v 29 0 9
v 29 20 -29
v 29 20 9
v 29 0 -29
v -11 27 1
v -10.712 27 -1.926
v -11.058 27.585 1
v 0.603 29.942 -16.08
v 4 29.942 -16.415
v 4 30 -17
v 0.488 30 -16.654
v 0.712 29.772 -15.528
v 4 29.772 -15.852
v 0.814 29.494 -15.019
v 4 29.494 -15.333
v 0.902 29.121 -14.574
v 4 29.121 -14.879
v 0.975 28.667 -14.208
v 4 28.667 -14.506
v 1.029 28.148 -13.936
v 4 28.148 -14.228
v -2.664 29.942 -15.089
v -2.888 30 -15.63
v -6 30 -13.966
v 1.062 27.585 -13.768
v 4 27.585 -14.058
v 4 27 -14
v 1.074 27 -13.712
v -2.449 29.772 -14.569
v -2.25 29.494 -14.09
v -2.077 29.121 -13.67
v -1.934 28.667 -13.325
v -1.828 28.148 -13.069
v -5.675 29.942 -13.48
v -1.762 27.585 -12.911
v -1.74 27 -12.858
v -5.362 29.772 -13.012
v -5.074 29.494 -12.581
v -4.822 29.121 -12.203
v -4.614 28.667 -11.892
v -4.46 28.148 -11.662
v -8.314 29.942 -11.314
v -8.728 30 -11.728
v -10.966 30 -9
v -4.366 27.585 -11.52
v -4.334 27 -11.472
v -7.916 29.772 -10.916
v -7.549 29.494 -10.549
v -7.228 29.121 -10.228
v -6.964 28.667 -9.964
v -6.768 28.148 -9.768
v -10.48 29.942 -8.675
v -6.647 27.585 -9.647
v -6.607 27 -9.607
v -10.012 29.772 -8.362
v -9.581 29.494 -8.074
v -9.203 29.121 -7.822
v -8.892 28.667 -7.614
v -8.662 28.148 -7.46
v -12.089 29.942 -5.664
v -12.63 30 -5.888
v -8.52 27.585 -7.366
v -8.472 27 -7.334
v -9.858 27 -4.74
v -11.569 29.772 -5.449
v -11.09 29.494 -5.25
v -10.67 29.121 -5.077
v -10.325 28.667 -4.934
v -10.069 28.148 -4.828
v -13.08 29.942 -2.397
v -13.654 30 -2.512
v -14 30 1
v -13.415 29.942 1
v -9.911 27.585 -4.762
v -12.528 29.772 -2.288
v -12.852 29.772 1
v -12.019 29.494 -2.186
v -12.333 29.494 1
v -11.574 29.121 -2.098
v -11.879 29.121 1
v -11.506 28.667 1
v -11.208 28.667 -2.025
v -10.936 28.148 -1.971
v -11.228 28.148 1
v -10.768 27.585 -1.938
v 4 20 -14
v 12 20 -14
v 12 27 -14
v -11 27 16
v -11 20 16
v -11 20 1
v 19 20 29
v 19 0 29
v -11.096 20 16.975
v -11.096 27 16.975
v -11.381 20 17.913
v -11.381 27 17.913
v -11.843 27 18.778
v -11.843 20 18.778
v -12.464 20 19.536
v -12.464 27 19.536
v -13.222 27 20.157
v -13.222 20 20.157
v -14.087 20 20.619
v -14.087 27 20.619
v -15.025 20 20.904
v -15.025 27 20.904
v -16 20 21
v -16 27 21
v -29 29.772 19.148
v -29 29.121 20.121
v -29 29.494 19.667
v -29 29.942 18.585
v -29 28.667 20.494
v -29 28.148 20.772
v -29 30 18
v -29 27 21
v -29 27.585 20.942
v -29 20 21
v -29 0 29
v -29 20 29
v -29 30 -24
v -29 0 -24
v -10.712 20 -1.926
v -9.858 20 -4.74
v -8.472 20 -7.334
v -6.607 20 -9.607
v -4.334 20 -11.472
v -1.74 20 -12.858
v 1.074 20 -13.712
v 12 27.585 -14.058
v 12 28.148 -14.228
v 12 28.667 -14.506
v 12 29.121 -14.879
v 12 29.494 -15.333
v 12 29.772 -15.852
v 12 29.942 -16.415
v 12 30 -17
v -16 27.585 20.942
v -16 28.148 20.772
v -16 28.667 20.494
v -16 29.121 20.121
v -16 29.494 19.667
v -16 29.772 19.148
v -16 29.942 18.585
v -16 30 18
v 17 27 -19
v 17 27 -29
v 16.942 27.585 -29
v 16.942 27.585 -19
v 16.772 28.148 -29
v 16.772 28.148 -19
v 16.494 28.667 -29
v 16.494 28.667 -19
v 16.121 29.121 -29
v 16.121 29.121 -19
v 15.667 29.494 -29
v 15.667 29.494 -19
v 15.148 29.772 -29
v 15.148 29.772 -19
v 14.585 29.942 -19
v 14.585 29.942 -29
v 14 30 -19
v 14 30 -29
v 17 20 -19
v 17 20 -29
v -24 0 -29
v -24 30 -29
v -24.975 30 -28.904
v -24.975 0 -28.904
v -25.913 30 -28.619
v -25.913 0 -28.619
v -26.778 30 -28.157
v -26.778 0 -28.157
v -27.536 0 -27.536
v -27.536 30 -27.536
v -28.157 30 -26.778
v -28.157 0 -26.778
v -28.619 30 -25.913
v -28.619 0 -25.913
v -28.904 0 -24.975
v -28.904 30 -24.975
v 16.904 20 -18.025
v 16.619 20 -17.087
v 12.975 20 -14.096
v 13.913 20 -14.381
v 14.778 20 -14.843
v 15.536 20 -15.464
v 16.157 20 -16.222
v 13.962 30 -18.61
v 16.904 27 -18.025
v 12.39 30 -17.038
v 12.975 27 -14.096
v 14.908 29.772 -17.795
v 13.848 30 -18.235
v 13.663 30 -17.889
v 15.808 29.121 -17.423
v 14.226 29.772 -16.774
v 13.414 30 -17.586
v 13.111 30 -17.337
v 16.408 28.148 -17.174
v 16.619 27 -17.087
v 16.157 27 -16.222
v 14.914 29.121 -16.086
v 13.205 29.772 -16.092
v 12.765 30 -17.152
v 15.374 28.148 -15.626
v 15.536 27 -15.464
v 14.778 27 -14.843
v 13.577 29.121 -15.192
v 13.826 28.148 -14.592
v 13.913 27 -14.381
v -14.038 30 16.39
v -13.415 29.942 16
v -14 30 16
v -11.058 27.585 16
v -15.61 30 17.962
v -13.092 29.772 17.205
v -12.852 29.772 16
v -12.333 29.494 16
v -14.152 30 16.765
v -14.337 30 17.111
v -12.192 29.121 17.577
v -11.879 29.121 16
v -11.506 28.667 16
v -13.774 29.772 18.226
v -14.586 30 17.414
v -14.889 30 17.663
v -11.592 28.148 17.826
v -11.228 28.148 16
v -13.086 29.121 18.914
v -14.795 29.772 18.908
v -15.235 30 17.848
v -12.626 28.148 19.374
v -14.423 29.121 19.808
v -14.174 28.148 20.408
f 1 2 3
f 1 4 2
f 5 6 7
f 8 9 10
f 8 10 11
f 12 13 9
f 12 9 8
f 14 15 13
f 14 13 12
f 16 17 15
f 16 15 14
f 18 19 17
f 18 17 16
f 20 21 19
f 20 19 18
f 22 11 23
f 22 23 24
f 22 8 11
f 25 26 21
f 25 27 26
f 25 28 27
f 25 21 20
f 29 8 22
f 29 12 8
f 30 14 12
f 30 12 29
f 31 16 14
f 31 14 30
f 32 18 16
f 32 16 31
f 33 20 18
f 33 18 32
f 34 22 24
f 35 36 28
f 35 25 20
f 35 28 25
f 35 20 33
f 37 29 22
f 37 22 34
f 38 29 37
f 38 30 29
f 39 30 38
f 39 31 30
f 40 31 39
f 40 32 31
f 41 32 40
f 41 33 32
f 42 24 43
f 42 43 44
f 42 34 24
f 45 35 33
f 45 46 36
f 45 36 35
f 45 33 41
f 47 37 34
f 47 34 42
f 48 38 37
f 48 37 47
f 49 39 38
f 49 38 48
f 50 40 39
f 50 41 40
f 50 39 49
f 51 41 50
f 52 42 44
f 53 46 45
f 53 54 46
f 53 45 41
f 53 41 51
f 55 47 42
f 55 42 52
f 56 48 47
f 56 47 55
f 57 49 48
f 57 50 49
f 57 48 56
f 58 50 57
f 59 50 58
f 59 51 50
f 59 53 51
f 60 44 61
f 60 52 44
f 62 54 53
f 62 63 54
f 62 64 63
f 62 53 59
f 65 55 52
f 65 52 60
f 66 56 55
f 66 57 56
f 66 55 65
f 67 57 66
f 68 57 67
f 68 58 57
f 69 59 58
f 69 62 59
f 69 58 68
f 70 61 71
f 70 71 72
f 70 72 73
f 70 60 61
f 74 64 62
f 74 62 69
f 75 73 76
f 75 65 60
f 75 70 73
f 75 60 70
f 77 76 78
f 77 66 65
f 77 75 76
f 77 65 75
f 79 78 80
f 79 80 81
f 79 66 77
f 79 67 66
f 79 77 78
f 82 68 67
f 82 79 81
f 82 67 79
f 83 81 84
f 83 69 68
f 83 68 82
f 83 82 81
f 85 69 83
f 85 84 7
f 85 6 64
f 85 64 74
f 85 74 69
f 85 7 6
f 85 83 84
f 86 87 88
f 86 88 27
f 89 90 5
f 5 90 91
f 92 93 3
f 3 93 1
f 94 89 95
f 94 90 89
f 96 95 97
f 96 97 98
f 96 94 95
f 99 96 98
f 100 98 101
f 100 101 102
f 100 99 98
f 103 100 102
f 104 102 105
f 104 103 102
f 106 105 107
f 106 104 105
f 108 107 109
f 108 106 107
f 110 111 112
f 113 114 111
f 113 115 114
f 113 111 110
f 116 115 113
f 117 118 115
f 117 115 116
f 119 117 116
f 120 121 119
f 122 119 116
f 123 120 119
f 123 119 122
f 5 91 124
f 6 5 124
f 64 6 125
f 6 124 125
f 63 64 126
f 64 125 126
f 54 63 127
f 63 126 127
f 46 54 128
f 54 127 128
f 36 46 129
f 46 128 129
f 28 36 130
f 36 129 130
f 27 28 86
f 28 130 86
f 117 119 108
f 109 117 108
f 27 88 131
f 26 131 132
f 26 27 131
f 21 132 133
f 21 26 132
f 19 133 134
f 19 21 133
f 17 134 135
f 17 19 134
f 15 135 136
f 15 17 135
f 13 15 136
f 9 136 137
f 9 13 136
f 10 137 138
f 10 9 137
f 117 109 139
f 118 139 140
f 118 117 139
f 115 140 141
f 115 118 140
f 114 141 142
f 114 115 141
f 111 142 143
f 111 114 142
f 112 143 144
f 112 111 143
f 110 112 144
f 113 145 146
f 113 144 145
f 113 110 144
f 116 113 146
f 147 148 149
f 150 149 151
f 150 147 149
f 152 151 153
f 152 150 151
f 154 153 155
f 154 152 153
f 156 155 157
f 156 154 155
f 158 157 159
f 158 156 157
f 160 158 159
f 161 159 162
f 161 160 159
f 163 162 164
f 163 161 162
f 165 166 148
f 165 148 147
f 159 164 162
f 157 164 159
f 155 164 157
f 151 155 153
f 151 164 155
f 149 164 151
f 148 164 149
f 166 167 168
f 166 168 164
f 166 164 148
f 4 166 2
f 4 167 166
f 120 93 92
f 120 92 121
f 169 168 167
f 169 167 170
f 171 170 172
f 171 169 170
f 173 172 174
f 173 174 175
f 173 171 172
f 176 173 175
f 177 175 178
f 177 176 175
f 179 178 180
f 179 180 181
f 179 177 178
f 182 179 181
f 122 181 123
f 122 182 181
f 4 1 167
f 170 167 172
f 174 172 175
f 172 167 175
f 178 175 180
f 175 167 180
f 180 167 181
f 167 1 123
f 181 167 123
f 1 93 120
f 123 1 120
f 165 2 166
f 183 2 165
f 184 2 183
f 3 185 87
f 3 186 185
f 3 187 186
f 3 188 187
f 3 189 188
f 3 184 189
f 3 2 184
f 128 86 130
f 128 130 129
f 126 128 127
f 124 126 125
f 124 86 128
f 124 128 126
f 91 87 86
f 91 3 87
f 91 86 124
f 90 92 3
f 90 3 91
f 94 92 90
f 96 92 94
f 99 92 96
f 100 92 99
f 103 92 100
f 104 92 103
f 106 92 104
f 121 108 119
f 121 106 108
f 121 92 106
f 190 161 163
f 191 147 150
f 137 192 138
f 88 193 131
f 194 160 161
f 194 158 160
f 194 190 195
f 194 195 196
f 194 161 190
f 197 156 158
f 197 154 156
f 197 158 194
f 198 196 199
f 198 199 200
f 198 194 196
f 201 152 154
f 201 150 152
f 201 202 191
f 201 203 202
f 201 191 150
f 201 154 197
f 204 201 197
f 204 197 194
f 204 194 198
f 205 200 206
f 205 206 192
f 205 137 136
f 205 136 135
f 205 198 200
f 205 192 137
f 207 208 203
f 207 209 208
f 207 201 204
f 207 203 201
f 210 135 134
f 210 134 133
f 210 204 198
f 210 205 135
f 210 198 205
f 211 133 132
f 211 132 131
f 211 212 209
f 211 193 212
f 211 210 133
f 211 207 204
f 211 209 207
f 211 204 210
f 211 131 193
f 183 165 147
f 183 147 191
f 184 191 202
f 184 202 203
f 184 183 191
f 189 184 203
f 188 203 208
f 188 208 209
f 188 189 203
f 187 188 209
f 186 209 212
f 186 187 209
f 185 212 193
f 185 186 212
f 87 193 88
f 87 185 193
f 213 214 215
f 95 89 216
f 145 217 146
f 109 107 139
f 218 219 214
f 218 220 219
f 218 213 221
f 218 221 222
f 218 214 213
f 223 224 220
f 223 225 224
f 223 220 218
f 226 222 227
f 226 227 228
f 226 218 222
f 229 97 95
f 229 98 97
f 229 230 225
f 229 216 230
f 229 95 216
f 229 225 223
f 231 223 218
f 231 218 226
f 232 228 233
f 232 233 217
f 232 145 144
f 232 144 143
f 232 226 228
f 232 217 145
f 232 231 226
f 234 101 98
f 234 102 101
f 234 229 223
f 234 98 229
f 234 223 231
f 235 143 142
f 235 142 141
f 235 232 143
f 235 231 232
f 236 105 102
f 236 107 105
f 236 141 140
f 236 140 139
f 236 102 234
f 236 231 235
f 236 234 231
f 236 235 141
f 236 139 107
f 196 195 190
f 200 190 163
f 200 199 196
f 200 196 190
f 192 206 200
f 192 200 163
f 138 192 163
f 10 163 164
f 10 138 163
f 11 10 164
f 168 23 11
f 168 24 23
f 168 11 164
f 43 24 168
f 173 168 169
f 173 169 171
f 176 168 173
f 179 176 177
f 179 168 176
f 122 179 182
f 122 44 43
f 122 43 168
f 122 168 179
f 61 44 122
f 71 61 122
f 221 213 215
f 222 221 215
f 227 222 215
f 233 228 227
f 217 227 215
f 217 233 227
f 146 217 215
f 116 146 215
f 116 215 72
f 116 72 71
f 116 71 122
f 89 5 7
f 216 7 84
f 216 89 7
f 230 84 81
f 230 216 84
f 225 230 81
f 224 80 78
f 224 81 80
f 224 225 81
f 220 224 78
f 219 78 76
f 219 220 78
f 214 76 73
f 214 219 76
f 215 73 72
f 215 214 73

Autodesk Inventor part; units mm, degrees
ref_plane "YZ Plane" through (0, 0, 0) normal (1, 0, 0) x (0, 1, 0)
ref_plane "XZ Plane" through (0, 0, 0) normal (0, 1, 0) x (-1, 0, 0)
ref_plane "XY Plane" through (0, 0, 0) normal (0, 0, 1) x (1, 0, 0)
sketch "Schizzo11" plane through (0, 0, 0) normal (0, 1, 0) x (-1, 0, 0)
  line L0 (29, -29) -> (-29, -29)
  line L1 (-29, -29) -> (-29, 9)
  line L2 (-19, 29) -> (29, 29)
  line L3 (29, 29) -> (29, -29)
  line L4 (29, -29) -> (-29, 29) construction
  line L5 (-29, -29) -> (29, 29) construction
  line L6 (29, -29) -> (29, 21)
  line L7 (29, 21) -> (16, 21)
  line L8 (11, 16) -> (11, 1)
  line L9 (29, -29) -> (-17, -29)
  line L10 (-17, -29) -> (-17, -19)
  line L11 (-12, -14) -> (-4, -14)
  arc A0 (-4, -14) -> (11, 1) centre (-4, 1) ccw
  arc A1 (16, 21) -> (11, 16) centre (16, 16) ccw
  arc A2 (-12, -14) -> (-17, -19) centre (-12, -19) ccw
  line L12 (-19, 29) -> (-29, 9)
  point P0 (0, 0)
  point P1 (11, 21)
  point P2 (11, -14)
  point P3 (-17, -14)
  dimension "d28" = 58
  dimension "d29" = 58
  dimension "d30" = 50
  dimension "d31" = 18
  dimension "d32" = 35
  dimension "d33" = 46
  dimension "d34" = 15
  dimension "d35" = 15
  dimension "d36" = 5
  dimension "d37" = 5
  dimension "d38" = 10
  dimension "d39" = 20
extrude "Estrusione6" add sketch "Schizzo11" along normal blind 30 contours L0 L10 A2 L11 A0 L8 A1 L7 L3
extrude "Estrusione7" add sketch "Schizzo11" along normal blind 20 contours L0 L1 L12 L2 L3 L7 A1 L8 A0 L11 A2 L10
fillet "Raccordo3" radius 3 7 edges at (8, 30, -14) (15.5355, 30, -15.4645) (17, 30, -24) (-11, 30, 8.5) (-12.4645, 30, 19.5355) (-22.5, 30, 21) (-6.6066, 30, -9.6066)
fillet "Raccordo4" radius 5 1 edges at (-29, 15, -29)
properties part number "primo esercizio"
